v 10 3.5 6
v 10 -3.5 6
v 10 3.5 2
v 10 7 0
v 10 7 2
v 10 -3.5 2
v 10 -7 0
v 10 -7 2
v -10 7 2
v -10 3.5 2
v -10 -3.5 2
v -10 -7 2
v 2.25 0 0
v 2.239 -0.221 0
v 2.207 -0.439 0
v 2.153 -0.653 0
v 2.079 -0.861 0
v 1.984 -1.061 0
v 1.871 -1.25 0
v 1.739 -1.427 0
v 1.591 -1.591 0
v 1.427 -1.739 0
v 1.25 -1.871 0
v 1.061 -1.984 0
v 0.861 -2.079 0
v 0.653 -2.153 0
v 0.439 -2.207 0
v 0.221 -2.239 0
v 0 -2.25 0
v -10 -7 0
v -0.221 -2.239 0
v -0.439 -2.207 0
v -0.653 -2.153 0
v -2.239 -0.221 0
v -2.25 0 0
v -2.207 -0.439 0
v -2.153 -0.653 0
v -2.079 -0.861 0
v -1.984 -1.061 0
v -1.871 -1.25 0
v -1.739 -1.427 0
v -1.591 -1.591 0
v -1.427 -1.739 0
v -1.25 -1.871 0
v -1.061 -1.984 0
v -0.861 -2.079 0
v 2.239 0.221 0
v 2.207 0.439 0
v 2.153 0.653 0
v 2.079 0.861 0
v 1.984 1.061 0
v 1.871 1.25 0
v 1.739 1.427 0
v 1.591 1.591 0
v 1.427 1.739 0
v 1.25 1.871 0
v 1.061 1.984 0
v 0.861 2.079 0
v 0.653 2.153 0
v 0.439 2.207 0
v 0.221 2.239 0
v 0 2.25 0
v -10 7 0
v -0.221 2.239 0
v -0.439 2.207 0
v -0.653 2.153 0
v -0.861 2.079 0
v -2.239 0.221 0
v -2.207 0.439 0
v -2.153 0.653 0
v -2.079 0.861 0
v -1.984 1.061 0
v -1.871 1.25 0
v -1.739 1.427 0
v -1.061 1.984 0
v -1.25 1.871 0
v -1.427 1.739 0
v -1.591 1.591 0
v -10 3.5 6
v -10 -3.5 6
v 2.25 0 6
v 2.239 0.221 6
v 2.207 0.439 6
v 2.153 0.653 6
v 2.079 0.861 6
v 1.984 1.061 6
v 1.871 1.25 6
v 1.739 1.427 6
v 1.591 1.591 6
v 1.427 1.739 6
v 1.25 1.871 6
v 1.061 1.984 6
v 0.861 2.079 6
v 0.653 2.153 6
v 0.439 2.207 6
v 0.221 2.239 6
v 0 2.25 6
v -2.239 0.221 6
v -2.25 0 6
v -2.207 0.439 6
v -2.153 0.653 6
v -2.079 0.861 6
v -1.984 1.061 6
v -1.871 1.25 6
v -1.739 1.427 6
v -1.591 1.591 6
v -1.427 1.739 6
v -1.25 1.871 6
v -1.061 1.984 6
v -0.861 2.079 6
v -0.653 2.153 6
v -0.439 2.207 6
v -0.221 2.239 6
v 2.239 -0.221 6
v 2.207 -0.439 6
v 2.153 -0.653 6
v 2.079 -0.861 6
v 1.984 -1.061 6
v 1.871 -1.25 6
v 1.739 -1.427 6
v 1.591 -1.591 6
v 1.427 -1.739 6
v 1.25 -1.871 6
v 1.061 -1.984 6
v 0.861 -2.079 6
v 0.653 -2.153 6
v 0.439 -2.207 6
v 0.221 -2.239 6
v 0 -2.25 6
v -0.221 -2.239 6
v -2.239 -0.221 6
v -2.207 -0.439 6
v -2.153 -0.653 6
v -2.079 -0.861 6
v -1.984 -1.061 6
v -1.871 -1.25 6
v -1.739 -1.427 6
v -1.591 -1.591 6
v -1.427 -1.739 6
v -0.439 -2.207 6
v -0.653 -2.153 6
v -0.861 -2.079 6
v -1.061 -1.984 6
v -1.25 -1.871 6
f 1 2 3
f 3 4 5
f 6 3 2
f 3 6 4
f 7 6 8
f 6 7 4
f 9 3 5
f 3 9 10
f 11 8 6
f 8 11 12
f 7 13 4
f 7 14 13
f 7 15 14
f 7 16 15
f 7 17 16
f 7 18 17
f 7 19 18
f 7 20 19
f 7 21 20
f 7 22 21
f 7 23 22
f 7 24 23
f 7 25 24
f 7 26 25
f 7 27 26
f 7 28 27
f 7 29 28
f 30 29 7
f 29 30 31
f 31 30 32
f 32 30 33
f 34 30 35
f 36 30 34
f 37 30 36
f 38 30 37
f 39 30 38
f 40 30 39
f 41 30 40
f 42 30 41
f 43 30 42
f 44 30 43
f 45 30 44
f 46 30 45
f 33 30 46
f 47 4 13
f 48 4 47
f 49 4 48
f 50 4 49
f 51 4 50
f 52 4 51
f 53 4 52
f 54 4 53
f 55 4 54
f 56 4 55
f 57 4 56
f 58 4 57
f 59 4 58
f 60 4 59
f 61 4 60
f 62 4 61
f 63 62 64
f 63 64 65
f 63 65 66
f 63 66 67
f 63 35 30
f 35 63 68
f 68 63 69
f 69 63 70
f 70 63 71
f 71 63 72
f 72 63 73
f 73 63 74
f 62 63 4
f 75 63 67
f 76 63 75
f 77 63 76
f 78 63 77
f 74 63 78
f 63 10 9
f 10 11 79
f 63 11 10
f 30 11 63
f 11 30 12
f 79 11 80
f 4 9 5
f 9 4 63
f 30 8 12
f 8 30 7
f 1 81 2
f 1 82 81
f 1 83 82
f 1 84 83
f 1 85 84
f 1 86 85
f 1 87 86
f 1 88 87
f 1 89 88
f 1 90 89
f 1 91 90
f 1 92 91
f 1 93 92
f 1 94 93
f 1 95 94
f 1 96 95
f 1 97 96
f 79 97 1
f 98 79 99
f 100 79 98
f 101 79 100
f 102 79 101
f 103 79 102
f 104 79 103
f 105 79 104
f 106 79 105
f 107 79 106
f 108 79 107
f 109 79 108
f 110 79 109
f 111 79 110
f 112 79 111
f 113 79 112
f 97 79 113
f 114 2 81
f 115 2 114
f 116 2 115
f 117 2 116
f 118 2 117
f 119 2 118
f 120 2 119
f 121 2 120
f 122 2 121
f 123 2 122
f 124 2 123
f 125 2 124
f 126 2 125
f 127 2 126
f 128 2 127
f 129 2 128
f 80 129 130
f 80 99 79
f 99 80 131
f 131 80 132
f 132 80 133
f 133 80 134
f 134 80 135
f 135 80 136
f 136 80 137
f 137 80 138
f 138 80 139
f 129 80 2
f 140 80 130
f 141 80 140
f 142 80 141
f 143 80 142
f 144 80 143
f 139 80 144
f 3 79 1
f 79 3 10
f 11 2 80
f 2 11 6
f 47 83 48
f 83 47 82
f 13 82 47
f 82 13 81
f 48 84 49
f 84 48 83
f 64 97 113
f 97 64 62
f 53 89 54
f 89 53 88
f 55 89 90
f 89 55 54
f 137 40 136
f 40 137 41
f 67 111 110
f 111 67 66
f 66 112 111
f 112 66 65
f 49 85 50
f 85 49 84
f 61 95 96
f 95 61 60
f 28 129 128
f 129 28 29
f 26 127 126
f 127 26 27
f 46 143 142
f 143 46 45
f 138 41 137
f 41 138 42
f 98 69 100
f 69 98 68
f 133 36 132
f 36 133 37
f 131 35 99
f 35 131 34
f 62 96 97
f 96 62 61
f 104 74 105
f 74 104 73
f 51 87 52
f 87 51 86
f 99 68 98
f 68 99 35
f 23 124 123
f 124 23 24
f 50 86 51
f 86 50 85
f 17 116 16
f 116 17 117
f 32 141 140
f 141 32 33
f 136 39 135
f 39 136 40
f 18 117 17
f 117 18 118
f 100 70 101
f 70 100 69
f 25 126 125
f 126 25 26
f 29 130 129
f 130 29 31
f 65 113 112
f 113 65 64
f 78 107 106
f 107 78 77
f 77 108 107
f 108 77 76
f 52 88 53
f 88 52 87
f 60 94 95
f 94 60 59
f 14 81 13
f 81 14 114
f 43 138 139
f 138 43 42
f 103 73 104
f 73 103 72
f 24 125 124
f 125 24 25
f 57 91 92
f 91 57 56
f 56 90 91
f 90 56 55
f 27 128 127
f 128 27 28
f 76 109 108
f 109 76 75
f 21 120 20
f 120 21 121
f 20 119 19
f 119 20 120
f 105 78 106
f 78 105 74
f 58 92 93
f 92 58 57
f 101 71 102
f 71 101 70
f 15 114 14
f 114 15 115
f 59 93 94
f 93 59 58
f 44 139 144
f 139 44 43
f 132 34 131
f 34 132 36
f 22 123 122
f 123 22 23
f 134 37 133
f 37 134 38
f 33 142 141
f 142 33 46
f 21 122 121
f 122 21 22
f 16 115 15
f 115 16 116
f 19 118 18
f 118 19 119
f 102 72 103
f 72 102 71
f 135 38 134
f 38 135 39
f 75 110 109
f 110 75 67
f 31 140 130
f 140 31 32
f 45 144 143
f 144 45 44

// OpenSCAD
// T-slot nut for aluminium extrusion
// Print orientation: flange down on the bed (z = 0), neck builds upward.

$fn = 64;

// ---- Dimensions (mm) ----
nut_length     = 20;   // length along X
flange_width   = 14;   // bottom flange width (Y)
flange_thick   = 2;    // flange thickness, z = 0 .. 2
neck_width     = 7;    // centred neck width (Y)
total_height   = 6;    // top of neck (z)
hole_d         = 4.5;  // vertical screw hole diameter
eps            = 0.5;  // cutter overshoot past faces

difference() {
    union() {
        // Bottom flange
        translate([-nut_length/2, -flange_width/2, 0])
            cube([nut_length, flange_width, flange_thick]);
        // Neck (overlaps flange slightly to ensure a single solid)
        translate([-nut_length/2, -neck_width/2, flange_thick - 0.01])
            cube([nut_length, neck_width, total_height - flange_thick + 0.01]);
    }
    // Vertical screw hole through the centre
    translate([0, 0, -eps])
        cylinder(d = hole_d, h = total_height + 2*eps);
}
